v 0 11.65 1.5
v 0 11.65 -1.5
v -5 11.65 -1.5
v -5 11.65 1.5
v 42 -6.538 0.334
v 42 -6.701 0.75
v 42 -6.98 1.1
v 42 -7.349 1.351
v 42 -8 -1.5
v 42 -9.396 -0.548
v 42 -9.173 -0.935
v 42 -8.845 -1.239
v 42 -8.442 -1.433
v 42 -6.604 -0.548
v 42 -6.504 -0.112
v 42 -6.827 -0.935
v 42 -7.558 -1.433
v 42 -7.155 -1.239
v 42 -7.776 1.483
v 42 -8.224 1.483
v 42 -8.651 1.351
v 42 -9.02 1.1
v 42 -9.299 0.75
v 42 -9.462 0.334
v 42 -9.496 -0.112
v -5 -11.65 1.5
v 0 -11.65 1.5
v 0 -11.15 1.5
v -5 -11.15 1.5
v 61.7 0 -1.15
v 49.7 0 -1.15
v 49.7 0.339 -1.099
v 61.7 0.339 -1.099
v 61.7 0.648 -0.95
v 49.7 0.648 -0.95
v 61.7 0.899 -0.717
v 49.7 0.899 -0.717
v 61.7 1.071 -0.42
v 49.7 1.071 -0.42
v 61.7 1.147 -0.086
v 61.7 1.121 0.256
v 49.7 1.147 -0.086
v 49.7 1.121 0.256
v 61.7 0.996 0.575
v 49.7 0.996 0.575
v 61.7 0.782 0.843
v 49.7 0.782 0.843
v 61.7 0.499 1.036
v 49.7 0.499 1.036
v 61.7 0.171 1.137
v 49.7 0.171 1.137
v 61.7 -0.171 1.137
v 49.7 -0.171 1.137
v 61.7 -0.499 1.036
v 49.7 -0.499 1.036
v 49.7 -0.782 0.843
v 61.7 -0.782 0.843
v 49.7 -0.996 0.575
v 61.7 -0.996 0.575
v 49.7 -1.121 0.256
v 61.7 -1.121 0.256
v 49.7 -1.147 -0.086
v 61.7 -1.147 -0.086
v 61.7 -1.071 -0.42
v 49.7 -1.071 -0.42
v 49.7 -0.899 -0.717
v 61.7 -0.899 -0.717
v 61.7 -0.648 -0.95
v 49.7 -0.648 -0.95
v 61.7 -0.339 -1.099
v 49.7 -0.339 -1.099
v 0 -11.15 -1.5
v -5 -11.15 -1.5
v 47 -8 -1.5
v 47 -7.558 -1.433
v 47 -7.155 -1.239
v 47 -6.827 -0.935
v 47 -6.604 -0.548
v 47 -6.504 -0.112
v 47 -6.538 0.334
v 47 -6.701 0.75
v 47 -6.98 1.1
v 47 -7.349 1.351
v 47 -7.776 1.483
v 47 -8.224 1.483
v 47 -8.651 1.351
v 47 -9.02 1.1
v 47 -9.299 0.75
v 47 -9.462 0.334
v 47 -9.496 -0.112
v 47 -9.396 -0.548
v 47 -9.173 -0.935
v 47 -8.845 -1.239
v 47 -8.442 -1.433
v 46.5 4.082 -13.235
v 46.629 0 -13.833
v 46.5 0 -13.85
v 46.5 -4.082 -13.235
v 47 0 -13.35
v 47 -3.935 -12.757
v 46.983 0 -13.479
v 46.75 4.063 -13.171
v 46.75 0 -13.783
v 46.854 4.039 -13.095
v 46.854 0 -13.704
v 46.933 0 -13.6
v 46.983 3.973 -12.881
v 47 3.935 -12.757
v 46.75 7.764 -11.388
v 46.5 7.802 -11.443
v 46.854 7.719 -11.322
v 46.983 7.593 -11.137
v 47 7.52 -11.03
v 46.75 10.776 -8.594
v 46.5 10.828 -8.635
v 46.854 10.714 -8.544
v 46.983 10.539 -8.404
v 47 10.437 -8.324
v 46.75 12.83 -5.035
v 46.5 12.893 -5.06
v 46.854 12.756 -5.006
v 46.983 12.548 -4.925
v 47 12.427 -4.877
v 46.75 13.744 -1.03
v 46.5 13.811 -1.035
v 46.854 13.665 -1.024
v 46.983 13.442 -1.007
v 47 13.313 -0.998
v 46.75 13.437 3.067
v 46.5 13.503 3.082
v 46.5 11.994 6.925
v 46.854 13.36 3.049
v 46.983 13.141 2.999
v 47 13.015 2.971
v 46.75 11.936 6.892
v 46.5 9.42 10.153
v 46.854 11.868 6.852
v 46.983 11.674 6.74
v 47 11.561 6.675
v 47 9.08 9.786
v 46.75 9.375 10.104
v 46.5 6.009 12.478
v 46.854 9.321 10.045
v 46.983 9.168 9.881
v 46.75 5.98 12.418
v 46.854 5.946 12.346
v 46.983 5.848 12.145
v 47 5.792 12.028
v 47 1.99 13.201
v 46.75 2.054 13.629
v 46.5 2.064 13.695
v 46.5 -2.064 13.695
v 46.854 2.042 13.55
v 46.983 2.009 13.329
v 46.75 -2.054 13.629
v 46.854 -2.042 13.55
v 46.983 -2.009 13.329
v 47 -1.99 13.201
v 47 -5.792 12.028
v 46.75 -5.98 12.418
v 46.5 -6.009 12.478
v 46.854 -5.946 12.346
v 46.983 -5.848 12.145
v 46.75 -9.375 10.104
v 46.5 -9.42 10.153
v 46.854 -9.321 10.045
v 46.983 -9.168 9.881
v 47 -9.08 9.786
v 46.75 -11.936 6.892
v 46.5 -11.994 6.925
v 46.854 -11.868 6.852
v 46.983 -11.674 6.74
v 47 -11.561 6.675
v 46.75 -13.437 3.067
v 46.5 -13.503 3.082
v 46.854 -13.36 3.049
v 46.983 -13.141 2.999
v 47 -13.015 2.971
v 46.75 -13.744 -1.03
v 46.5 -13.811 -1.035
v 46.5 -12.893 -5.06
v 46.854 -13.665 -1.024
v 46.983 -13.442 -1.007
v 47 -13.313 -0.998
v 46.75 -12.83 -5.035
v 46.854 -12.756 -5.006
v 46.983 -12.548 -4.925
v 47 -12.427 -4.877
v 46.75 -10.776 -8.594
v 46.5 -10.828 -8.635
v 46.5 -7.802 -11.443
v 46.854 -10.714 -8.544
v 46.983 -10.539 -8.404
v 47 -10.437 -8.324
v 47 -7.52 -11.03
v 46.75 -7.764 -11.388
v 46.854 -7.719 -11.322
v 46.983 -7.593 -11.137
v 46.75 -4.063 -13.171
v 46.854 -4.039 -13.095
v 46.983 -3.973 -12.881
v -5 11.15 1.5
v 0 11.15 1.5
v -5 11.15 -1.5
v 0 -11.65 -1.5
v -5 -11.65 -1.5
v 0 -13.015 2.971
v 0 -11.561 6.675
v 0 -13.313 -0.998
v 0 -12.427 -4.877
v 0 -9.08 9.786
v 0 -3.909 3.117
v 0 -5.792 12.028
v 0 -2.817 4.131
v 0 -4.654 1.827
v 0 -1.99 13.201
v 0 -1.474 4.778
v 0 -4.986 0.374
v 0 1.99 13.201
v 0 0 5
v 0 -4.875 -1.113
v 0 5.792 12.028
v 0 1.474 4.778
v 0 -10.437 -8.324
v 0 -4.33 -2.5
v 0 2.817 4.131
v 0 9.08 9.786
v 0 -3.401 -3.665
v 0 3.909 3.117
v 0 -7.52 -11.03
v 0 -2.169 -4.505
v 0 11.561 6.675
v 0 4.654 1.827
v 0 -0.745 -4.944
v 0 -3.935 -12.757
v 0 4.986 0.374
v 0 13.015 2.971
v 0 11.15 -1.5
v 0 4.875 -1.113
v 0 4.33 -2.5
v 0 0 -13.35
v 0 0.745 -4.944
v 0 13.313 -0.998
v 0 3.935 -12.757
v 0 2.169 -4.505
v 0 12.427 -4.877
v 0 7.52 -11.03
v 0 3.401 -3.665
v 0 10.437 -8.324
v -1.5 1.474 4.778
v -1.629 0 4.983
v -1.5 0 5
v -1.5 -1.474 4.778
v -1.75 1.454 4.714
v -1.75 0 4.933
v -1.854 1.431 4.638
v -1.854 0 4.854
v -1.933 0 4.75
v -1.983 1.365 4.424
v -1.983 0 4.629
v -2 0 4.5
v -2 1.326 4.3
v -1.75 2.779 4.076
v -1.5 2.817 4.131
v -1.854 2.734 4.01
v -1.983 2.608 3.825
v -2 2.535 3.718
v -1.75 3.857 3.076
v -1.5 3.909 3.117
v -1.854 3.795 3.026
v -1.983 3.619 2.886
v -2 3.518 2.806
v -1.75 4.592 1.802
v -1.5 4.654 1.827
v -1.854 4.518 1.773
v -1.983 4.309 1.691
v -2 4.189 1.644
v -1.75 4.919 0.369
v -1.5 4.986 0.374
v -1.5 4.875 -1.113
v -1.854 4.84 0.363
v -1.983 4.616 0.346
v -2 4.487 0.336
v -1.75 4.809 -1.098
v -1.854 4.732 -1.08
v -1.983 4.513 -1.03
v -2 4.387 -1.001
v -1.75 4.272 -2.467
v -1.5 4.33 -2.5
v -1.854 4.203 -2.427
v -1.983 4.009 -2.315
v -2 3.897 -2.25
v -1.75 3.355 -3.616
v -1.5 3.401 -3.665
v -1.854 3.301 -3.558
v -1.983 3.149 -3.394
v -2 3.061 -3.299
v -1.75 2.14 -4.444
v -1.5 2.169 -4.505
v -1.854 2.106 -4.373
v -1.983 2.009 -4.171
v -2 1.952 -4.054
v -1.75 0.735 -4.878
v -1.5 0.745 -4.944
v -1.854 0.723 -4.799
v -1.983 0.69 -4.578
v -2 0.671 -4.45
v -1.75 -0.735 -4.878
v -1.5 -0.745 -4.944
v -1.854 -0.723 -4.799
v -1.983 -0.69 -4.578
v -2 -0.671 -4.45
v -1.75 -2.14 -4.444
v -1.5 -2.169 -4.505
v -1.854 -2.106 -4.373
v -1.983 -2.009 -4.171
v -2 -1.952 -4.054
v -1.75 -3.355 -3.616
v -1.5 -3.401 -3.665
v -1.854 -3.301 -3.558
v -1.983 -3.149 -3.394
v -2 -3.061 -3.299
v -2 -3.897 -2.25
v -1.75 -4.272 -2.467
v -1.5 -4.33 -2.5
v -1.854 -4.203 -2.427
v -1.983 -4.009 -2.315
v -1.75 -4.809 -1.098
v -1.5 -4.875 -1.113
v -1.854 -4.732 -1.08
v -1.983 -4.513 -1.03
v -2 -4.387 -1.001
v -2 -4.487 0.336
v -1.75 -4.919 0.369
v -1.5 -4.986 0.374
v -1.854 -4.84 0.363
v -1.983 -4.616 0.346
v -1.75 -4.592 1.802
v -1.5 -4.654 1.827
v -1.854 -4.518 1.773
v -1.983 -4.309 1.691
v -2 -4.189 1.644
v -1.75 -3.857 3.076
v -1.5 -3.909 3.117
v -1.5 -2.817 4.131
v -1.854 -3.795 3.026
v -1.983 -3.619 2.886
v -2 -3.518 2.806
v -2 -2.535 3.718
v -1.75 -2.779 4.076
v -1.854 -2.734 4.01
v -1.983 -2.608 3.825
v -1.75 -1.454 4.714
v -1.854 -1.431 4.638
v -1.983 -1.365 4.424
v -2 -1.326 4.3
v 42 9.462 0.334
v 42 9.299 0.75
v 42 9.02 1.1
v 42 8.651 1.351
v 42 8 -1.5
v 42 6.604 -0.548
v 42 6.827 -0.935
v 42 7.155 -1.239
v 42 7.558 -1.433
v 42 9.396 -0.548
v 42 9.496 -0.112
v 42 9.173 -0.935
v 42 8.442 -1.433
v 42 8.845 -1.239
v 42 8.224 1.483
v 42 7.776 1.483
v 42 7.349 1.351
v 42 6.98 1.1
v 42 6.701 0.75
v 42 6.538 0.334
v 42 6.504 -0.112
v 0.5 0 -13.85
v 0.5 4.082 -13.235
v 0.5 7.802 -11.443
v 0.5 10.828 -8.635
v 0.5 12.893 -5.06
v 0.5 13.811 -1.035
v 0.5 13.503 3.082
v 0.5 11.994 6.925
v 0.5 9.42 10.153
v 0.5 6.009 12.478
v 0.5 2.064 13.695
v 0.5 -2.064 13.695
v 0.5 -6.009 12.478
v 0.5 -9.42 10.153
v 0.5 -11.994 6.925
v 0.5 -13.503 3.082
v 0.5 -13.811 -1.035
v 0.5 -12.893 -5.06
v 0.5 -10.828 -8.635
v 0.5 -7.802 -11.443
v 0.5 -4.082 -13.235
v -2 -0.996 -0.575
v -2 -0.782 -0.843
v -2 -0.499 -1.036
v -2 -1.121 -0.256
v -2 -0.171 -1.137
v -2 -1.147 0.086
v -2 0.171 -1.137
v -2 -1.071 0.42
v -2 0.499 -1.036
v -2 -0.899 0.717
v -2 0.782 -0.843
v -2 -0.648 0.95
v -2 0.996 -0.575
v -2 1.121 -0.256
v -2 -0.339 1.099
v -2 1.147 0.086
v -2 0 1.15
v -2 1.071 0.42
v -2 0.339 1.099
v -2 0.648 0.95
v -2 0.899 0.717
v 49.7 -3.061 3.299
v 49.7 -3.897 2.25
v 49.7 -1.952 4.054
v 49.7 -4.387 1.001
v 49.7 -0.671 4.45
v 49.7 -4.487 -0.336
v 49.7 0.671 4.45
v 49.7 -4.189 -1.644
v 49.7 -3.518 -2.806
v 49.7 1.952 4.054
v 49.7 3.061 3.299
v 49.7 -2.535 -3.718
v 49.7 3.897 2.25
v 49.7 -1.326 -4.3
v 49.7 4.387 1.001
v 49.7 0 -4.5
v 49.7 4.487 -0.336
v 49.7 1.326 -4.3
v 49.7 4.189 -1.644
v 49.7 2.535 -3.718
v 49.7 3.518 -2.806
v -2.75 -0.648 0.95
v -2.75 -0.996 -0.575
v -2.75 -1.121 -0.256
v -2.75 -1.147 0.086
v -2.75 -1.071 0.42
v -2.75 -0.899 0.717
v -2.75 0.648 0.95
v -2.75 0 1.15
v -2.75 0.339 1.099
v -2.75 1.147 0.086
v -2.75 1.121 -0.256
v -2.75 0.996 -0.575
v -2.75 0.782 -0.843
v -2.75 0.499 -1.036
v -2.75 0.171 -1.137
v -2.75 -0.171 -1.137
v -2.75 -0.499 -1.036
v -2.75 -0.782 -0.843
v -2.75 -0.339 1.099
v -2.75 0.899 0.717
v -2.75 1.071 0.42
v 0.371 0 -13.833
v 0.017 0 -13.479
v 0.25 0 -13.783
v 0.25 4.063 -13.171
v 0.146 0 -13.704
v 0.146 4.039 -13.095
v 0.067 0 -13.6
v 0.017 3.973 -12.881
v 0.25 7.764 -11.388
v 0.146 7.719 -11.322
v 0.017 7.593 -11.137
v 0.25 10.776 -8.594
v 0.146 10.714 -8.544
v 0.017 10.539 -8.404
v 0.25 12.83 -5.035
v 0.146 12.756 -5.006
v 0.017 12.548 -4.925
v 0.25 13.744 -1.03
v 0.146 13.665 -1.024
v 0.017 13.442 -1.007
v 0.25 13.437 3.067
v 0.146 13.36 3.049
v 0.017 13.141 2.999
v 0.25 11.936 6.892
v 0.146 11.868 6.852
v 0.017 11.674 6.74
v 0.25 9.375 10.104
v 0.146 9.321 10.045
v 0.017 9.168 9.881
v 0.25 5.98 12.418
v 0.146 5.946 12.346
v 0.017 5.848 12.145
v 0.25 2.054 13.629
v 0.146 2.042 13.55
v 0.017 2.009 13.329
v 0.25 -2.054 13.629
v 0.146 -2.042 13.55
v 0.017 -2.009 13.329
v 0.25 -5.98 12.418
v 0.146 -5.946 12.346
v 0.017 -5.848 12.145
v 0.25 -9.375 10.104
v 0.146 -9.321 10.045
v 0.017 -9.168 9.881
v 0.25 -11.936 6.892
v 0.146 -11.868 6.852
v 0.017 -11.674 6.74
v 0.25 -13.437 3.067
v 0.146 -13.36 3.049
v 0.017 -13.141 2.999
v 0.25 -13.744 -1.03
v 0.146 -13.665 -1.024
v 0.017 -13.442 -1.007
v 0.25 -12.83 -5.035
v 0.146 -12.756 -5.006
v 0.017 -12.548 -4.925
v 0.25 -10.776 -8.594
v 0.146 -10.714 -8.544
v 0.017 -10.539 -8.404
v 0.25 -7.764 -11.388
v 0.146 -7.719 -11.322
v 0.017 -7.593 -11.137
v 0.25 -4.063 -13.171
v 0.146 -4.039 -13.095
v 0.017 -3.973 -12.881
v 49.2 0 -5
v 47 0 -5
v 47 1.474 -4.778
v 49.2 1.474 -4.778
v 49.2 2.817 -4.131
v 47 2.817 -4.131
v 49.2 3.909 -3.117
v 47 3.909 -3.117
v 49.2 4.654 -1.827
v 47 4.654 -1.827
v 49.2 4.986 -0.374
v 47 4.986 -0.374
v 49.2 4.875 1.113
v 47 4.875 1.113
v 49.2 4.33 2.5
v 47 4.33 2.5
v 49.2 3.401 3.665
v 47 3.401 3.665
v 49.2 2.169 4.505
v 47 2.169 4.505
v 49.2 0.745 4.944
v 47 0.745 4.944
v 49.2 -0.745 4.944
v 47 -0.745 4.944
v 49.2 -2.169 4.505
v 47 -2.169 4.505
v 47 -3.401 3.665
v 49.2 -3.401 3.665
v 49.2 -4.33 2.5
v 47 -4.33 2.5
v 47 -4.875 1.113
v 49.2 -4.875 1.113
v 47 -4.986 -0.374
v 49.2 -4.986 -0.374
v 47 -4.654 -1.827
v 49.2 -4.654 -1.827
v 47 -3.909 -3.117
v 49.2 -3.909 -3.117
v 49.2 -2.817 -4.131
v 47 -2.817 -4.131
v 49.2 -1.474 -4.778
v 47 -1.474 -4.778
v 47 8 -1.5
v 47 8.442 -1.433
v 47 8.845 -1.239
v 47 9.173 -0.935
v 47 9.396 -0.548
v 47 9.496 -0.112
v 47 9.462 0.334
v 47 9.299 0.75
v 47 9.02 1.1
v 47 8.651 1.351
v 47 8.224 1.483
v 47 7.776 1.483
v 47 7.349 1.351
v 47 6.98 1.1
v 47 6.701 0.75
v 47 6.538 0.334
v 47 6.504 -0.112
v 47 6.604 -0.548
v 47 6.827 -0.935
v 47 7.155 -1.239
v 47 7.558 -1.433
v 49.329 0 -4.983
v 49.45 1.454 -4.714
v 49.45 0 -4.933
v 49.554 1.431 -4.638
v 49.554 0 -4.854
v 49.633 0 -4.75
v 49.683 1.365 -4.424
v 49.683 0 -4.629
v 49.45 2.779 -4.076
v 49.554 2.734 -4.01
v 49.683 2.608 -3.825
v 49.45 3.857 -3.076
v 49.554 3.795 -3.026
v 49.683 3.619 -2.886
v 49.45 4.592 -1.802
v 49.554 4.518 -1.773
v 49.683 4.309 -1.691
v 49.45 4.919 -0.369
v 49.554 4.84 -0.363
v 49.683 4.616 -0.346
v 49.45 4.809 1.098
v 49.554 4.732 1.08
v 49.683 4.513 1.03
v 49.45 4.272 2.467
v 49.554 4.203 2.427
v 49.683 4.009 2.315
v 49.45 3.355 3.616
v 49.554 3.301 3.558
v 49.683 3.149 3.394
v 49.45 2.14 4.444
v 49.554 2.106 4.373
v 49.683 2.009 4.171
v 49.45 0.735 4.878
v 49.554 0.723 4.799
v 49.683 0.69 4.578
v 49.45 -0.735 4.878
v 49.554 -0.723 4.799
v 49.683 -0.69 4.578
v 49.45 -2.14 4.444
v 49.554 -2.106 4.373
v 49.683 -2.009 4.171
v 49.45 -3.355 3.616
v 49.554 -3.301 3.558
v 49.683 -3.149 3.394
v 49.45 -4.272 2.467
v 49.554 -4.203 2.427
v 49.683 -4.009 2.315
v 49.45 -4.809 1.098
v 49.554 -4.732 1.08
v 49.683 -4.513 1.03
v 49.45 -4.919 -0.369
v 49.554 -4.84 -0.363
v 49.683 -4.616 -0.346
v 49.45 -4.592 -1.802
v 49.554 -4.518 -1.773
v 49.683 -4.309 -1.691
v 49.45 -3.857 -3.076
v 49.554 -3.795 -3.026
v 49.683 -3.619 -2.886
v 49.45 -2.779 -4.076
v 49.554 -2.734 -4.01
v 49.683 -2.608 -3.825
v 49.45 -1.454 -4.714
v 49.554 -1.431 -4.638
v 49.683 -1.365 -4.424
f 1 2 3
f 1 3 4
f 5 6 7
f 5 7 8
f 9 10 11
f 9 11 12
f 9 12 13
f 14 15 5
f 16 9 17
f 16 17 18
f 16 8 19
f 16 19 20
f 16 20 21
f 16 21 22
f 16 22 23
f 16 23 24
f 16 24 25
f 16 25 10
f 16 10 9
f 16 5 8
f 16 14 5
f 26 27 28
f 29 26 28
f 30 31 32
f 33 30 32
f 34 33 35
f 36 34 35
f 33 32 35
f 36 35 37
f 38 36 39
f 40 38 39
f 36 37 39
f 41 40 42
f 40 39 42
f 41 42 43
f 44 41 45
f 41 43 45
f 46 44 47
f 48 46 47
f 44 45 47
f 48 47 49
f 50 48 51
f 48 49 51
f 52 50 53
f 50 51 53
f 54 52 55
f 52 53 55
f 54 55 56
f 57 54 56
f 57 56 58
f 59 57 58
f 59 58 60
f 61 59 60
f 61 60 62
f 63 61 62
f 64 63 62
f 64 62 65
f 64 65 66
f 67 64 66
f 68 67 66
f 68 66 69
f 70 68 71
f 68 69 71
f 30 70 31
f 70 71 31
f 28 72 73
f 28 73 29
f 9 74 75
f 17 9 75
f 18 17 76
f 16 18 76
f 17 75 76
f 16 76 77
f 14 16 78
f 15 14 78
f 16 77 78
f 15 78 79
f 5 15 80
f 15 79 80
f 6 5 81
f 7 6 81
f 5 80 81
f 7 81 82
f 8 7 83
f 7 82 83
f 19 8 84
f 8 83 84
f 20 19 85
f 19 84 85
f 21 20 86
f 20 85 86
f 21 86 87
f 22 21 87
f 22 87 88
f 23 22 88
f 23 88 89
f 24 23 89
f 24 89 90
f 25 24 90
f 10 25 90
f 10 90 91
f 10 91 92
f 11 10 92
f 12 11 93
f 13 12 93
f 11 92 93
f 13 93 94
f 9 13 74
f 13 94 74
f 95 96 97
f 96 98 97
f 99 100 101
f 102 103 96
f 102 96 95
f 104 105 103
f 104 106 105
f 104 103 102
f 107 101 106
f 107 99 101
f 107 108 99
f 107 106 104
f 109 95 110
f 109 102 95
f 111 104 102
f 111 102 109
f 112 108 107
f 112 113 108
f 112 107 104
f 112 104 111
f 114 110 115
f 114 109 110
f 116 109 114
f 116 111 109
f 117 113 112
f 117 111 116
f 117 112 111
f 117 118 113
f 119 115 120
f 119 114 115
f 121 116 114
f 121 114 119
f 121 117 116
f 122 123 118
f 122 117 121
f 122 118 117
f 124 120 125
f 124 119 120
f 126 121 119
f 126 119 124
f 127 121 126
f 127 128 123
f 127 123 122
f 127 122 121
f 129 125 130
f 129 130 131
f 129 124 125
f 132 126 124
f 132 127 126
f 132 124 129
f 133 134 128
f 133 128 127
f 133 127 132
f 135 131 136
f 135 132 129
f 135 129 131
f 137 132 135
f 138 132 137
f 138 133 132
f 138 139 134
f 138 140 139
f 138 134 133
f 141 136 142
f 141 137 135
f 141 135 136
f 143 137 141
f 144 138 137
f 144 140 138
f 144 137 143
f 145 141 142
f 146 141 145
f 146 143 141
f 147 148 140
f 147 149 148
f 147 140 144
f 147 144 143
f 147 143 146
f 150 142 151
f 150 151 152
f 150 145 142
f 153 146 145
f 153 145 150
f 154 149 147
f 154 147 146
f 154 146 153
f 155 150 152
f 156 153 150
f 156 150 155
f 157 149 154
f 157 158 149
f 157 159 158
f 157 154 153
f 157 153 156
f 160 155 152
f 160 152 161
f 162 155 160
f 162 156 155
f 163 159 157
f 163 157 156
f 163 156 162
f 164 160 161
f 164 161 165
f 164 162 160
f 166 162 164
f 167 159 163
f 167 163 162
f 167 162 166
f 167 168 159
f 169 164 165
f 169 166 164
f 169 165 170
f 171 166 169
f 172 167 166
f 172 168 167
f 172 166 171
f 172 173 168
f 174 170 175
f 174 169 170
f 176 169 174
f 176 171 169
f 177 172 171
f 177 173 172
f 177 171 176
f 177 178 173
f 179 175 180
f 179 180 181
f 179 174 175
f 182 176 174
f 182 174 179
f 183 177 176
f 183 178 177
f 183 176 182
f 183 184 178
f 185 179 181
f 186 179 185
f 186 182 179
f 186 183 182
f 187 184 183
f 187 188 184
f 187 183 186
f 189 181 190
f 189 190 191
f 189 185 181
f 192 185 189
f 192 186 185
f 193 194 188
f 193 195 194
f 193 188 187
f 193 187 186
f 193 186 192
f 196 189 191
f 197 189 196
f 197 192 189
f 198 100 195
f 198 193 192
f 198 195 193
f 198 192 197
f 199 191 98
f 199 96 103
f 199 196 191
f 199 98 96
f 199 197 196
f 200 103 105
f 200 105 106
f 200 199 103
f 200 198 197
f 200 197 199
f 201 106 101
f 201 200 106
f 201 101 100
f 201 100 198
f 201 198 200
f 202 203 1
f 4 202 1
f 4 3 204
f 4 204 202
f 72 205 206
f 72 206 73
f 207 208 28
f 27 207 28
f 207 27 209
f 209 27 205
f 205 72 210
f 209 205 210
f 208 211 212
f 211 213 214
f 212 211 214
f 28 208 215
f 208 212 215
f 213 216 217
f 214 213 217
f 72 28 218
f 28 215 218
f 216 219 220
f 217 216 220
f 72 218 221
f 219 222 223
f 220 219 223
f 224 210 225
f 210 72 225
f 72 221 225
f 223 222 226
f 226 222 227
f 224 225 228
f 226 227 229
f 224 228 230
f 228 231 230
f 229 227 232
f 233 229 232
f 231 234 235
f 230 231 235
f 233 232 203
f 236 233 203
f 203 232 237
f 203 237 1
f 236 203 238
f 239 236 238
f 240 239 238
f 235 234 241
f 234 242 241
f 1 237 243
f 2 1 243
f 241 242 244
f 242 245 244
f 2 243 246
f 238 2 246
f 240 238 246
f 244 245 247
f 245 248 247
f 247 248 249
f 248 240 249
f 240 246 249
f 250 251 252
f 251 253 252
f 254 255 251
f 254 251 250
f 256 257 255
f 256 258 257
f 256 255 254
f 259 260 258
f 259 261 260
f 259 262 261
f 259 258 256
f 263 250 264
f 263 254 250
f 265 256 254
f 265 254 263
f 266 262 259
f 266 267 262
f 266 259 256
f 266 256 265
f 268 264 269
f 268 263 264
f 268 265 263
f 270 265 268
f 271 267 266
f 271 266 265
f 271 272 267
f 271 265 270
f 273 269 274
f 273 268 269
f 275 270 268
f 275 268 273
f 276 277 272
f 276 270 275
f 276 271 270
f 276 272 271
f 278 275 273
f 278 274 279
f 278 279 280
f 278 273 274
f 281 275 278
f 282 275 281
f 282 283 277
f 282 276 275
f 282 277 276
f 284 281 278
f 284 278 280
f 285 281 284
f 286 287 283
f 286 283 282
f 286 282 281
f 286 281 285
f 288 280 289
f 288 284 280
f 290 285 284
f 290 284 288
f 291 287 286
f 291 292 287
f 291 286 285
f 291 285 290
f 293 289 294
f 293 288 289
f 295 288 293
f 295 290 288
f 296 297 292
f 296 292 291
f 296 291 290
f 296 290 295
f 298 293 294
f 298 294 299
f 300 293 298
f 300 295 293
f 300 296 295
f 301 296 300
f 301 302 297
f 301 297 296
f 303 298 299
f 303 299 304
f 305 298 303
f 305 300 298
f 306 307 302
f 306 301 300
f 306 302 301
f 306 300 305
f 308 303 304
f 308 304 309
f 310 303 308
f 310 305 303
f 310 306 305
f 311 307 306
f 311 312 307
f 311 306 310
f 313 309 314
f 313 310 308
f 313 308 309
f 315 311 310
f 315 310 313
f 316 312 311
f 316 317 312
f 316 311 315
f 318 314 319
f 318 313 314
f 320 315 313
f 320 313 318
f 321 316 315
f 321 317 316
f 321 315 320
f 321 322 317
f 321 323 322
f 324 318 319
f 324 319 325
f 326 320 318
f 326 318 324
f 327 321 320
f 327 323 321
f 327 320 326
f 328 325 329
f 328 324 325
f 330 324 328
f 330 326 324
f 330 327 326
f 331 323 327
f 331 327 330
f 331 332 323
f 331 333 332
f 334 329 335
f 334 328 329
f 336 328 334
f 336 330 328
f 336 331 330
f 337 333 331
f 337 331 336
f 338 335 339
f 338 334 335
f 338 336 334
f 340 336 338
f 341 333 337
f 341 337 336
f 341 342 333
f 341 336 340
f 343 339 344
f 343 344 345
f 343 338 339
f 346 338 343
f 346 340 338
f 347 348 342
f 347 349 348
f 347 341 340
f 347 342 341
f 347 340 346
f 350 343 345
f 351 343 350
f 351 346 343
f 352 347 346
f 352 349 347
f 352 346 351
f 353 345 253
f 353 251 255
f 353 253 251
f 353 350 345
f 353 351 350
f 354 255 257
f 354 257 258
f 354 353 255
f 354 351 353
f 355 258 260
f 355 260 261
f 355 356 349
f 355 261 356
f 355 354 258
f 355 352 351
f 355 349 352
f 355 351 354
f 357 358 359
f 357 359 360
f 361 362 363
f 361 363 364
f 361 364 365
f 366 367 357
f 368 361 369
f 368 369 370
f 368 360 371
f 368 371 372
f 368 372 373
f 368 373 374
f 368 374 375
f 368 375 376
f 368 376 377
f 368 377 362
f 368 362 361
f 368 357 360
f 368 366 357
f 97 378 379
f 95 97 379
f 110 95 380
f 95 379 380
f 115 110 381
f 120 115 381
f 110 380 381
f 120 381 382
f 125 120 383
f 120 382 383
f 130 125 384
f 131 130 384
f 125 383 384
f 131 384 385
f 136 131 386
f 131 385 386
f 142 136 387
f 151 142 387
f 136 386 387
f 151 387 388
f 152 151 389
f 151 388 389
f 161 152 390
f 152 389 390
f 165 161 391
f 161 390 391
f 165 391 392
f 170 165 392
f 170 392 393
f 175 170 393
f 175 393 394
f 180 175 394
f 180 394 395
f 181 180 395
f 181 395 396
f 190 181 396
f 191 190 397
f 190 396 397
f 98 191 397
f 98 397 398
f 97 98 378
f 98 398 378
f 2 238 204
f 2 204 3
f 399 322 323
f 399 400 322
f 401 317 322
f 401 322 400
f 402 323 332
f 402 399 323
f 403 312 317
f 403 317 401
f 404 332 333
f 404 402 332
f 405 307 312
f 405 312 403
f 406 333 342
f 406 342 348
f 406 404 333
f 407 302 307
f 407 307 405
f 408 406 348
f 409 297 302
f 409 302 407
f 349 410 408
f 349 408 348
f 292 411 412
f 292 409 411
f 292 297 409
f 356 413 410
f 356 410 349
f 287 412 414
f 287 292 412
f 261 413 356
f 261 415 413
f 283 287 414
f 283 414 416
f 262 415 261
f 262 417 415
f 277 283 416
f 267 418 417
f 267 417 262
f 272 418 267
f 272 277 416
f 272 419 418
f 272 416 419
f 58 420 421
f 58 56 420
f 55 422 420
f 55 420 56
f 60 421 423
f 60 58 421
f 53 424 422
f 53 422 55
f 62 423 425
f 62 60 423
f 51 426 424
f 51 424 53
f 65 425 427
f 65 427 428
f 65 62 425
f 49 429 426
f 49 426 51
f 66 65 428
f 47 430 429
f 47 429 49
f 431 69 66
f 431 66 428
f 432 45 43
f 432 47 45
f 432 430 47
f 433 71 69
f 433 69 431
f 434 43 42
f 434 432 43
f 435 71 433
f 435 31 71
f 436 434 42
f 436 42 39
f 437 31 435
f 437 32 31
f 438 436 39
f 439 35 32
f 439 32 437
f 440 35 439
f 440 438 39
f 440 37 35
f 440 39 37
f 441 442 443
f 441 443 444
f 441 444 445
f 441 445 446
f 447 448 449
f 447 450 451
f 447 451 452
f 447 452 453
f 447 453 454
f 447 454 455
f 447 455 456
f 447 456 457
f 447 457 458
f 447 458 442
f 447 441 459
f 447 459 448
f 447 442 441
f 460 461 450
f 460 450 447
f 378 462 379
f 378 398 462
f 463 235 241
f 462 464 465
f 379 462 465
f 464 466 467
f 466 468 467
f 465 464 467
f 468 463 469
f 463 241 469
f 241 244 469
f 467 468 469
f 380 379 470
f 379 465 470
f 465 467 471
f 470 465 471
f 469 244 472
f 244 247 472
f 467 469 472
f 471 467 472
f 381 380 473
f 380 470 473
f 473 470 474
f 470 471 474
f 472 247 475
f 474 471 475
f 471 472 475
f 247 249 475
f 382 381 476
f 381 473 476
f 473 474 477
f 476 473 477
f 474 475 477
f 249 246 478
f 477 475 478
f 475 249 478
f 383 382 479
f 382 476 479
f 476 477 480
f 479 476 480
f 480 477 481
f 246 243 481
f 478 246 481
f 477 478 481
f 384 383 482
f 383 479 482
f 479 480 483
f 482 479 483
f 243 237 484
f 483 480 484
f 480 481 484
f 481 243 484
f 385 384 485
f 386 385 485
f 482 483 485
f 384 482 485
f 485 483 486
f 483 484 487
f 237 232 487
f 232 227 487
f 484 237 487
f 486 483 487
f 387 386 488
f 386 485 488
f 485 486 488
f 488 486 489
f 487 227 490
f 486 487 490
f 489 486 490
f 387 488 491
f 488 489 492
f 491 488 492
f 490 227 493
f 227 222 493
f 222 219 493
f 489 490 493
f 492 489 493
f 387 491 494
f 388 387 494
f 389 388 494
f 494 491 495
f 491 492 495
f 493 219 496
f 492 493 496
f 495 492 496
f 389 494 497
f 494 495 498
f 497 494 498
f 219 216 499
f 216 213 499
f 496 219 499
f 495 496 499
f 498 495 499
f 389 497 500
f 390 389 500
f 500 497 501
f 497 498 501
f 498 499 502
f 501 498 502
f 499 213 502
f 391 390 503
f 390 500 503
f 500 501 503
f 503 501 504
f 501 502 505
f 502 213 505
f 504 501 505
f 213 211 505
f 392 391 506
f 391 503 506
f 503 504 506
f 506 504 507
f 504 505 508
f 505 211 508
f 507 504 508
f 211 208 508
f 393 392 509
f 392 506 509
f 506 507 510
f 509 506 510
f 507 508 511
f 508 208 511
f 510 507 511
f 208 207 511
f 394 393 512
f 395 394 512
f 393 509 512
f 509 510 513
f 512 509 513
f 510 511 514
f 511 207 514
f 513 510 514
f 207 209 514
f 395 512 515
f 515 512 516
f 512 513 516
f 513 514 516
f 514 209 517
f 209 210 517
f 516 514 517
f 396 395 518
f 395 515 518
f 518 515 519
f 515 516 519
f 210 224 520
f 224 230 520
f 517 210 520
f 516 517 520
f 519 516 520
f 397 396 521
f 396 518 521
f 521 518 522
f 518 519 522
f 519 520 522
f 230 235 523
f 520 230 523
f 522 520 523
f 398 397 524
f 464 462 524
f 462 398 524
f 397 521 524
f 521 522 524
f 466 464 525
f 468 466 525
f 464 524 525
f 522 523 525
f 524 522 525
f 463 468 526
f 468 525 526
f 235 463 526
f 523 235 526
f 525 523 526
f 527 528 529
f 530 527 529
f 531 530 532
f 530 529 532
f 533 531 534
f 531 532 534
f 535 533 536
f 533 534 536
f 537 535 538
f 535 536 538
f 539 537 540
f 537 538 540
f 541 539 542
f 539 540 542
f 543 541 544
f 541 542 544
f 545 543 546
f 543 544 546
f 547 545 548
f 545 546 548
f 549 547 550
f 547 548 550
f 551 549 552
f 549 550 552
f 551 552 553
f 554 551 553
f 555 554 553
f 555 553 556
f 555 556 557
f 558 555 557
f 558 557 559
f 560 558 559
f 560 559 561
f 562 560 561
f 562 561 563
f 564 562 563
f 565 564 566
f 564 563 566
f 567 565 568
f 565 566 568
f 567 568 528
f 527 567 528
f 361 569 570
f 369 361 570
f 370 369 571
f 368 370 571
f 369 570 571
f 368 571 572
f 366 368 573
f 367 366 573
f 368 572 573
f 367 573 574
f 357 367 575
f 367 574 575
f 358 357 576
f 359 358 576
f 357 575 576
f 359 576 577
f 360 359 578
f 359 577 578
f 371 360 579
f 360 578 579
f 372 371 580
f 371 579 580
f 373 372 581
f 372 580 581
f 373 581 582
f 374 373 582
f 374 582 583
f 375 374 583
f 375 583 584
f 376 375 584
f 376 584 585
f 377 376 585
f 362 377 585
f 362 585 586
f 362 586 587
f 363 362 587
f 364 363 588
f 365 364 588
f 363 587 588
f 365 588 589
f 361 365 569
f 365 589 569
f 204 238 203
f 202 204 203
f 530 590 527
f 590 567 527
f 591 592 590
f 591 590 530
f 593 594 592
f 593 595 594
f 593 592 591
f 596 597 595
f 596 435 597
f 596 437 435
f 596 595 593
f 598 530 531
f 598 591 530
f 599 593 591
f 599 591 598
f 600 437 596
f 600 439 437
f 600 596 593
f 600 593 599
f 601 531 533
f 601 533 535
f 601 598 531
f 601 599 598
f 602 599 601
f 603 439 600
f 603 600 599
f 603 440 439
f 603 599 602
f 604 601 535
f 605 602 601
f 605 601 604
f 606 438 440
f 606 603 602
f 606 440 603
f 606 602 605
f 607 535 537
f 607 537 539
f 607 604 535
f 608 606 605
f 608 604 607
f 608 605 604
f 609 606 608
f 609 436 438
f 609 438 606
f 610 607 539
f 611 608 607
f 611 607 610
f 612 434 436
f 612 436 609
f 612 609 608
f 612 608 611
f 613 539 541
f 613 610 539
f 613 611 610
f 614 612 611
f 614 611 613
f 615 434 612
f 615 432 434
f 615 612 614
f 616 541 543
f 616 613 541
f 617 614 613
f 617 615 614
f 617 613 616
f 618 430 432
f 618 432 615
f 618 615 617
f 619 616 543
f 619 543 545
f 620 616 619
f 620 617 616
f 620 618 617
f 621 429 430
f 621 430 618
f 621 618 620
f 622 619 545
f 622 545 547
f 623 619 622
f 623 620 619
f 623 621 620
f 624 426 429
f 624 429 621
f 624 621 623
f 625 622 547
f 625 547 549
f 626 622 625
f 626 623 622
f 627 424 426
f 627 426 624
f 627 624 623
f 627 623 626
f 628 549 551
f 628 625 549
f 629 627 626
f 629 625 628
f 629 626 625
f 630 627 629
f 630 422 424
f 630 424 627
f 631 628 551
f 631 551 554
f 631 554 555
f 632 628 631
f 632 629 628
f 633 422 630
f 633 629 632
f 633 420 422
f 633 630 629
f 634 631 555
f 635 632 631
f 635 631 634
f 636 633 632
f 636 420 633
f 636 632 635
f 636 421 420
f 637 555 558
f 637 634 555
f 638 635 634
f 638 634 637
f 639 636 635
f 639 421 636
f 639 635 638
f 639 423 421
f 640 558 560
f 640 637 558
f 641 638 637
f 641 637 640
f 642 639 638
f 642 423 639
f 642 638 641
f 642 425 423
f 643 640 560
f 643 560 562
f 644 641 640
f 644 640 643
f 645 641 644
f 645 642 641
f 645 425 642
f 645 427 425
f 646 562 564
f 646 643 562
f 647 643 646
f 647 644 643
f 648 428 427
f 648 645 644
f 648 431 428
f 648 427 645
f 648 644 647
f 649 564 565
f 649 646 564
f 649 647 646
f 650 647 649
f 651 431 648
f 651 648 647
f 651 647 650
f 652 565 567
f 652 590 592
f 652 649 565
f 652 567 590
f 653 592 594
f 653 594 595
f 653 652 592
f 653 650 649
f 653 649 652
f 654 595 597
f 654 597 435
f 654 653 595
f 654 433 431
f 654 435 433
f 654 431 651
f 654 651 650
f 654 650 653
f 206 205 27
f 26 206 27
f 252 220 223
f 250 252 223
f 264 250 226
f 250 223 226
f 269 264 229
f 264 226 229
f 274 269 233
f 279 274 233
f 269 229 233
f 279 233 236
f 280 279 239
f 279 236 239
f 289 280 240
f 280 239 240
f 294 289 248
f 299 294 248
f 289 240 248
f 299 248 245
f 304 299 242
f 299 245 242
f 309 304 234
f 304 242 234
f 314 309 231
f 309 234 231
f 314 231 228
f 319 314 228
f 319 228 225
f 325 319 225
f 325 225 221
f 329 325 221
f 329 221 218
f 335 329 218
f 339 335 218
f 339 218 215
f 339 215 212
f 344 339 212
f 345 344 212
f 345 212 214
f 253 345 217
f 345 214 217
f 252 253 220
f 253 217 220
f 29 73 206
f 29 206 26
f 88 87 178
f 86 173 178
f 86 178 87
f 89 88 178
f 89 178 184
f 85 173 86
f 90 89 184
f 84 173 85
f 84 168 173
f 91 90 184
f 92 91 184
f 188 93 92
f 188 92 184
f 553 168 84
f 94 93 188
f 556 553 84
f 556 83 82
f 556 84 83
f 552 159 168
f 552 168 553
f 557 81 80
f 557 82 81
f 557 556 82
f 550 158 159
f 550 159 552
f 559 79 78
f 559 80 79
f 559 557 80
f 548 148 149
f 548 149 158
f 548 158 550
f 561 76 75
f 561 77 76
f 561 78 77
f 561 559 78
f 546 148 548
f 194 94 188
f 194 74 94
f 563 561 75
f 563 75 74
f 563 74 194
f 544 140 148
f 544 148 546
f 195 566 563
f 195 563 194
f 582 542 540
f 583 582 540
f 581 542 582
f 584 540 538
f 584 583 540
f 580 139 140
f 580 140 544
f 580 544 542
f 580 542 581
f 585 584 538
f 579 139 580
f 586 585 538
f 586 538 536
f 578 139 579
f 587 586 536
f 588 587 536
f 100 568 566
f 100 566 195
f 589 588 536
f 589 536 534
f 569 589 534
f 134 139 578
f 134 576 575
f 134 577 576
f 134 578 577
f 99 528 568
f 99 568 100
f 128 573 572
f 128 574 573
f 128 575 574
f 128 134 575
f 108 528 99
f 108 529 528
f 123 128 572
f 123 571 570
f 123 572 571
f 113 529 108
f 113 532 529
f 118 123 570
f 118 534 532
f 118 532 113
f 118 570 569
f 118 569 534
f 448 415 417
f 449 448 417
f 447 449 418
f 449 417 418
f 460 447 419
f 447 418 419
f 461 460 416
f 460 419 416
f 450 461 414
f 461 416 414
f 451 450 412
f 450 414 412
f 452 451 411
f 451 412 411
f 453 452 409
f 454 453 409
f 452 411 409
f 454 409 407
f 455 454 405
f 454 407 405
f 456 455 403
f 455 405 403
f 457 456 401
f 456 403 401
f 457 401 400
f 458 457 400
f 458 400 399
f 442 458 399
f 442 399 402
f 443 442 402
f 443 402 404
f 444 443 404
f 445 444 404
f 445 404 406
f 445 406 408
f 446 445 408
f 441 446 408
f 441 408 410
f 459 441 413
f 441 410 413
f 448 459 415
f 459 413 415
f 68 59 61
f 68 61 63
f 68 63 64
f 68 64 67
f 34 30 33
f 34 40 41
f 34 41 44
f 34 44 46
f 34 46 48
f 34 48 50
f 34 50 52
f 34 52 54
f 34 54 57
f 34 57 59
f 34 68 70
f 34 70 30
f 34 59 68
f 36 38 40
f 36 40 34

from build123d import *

# Parameters (mm, degrees)
SKETCH1_R           = 13.85
BOSS_EXTRUDE1_DEPTH = 47
SKETCH2_R           = 5
BOSS_EXTRUDE2_DEPTH = 2.7
SKETCH3_R           = 1.15
BOSS_EXTRUDE3_DEPTH = 12
SKETCH4_R           = 5
BOSS_EXTRUDE4_DEPTH = 2
SKETCH5_R           = 1.15
BOSS_EXTRUDE5_DEPTH = 0.75
SKETCH6_W           = 3
SKETCH6_H           = 0.5
BOSS_EXTRUDE6_DEPTH = 5
SKETCH7_R           = 1.5
CUT_EXTRUDE1_DEPTH  = 5
FILLET1_R           = 0.5


with BuildPart() as part:
    # Sketch1 → Boss-Extrude1 (new body)
    with BuildSketch(Plane(origin=(0, 0, 0), x_dir=(0, 0, -1), z_dir=(1, 0, 0))):
        Circle(SKETCH1_R)
    extrude(amount=BOSS_EXTRUDE1_DEPTH)

    # Sketch2 → Boss-Extrude2 (add)
    with BuildSketch(Plane(origin=(47, 0, 0), x_dir=(0, 0, -1), z_dir=(1, 0, 0))):
        Circle(SKETCH2_R)
    extrude(amount=BOSS_EXTRUDE2_DEPTH)

    # Sketch3 → Boss-Extrude3 (add)
    with BuildSketch(Plane(origin=(49.7, 0, 0), x_dir=(0, 0, -1), z_dir=(1, 0, 0))):
        Circle(SKETCH3_R)
    extrude(amount=BOSS_EXTRUDE3_DEPTH)

    # Sketch4 → Boss-Extrude4 (add)
    with BuildSketch(Plane.ZY):
        Circle(SKETCH4_R)
    extrude(amount=BOSS_EXTRUDE4_DEPTH)

    # Sketch5 → Boss-Extrude5 (add)
    with BuildSketch(Plane.ZY.offset(2)):
        Circle(SKETCH5_R)
    extrude(amount=BOSS_EXTRUDE5_DEPTH)

    # Sketch6 → Boss-Extrude6 (add)
    with BuildSketch(Plane.ZY):
        with Locations((0, 11.4)):
            Rectangle(SKETCH6_W, SKETCH6_H)
        with Locations((0, -11.4)):
            Rectangle(SKETCH6_W, SKETCH6_H)
    extrude(amount=BOSS_EXTRUDE6_DEPTH)

    # Sketch7 → Cut-Extrude1 (cut)
    with BuildSketch(Plane(origin=(47, 0, 0), x_dir=(0, 0, -1), z_dir=(1, 0, 0))):
        with Locations((0, 8)):
            Circle(SKETCH7_R)
        with Locations((0, -8)):
            Circle(SKETCH7_R)
    extrude(amount=-CUT_EXTRUDE1_DEPTH, mode=Mode.SUBTRACT)

    # Fillet1
    fillet1_edges = [part.edges().sort_by_distance(p)[0] for p in [
        (-2, 0, -5),
        (0, 0, 13.85),
        (47, 0, 13.85),
        (49.7, 0, 5),
    ]]
    fillet(fillet1_edges, radius=FILLET1_R)


solid = part.part
